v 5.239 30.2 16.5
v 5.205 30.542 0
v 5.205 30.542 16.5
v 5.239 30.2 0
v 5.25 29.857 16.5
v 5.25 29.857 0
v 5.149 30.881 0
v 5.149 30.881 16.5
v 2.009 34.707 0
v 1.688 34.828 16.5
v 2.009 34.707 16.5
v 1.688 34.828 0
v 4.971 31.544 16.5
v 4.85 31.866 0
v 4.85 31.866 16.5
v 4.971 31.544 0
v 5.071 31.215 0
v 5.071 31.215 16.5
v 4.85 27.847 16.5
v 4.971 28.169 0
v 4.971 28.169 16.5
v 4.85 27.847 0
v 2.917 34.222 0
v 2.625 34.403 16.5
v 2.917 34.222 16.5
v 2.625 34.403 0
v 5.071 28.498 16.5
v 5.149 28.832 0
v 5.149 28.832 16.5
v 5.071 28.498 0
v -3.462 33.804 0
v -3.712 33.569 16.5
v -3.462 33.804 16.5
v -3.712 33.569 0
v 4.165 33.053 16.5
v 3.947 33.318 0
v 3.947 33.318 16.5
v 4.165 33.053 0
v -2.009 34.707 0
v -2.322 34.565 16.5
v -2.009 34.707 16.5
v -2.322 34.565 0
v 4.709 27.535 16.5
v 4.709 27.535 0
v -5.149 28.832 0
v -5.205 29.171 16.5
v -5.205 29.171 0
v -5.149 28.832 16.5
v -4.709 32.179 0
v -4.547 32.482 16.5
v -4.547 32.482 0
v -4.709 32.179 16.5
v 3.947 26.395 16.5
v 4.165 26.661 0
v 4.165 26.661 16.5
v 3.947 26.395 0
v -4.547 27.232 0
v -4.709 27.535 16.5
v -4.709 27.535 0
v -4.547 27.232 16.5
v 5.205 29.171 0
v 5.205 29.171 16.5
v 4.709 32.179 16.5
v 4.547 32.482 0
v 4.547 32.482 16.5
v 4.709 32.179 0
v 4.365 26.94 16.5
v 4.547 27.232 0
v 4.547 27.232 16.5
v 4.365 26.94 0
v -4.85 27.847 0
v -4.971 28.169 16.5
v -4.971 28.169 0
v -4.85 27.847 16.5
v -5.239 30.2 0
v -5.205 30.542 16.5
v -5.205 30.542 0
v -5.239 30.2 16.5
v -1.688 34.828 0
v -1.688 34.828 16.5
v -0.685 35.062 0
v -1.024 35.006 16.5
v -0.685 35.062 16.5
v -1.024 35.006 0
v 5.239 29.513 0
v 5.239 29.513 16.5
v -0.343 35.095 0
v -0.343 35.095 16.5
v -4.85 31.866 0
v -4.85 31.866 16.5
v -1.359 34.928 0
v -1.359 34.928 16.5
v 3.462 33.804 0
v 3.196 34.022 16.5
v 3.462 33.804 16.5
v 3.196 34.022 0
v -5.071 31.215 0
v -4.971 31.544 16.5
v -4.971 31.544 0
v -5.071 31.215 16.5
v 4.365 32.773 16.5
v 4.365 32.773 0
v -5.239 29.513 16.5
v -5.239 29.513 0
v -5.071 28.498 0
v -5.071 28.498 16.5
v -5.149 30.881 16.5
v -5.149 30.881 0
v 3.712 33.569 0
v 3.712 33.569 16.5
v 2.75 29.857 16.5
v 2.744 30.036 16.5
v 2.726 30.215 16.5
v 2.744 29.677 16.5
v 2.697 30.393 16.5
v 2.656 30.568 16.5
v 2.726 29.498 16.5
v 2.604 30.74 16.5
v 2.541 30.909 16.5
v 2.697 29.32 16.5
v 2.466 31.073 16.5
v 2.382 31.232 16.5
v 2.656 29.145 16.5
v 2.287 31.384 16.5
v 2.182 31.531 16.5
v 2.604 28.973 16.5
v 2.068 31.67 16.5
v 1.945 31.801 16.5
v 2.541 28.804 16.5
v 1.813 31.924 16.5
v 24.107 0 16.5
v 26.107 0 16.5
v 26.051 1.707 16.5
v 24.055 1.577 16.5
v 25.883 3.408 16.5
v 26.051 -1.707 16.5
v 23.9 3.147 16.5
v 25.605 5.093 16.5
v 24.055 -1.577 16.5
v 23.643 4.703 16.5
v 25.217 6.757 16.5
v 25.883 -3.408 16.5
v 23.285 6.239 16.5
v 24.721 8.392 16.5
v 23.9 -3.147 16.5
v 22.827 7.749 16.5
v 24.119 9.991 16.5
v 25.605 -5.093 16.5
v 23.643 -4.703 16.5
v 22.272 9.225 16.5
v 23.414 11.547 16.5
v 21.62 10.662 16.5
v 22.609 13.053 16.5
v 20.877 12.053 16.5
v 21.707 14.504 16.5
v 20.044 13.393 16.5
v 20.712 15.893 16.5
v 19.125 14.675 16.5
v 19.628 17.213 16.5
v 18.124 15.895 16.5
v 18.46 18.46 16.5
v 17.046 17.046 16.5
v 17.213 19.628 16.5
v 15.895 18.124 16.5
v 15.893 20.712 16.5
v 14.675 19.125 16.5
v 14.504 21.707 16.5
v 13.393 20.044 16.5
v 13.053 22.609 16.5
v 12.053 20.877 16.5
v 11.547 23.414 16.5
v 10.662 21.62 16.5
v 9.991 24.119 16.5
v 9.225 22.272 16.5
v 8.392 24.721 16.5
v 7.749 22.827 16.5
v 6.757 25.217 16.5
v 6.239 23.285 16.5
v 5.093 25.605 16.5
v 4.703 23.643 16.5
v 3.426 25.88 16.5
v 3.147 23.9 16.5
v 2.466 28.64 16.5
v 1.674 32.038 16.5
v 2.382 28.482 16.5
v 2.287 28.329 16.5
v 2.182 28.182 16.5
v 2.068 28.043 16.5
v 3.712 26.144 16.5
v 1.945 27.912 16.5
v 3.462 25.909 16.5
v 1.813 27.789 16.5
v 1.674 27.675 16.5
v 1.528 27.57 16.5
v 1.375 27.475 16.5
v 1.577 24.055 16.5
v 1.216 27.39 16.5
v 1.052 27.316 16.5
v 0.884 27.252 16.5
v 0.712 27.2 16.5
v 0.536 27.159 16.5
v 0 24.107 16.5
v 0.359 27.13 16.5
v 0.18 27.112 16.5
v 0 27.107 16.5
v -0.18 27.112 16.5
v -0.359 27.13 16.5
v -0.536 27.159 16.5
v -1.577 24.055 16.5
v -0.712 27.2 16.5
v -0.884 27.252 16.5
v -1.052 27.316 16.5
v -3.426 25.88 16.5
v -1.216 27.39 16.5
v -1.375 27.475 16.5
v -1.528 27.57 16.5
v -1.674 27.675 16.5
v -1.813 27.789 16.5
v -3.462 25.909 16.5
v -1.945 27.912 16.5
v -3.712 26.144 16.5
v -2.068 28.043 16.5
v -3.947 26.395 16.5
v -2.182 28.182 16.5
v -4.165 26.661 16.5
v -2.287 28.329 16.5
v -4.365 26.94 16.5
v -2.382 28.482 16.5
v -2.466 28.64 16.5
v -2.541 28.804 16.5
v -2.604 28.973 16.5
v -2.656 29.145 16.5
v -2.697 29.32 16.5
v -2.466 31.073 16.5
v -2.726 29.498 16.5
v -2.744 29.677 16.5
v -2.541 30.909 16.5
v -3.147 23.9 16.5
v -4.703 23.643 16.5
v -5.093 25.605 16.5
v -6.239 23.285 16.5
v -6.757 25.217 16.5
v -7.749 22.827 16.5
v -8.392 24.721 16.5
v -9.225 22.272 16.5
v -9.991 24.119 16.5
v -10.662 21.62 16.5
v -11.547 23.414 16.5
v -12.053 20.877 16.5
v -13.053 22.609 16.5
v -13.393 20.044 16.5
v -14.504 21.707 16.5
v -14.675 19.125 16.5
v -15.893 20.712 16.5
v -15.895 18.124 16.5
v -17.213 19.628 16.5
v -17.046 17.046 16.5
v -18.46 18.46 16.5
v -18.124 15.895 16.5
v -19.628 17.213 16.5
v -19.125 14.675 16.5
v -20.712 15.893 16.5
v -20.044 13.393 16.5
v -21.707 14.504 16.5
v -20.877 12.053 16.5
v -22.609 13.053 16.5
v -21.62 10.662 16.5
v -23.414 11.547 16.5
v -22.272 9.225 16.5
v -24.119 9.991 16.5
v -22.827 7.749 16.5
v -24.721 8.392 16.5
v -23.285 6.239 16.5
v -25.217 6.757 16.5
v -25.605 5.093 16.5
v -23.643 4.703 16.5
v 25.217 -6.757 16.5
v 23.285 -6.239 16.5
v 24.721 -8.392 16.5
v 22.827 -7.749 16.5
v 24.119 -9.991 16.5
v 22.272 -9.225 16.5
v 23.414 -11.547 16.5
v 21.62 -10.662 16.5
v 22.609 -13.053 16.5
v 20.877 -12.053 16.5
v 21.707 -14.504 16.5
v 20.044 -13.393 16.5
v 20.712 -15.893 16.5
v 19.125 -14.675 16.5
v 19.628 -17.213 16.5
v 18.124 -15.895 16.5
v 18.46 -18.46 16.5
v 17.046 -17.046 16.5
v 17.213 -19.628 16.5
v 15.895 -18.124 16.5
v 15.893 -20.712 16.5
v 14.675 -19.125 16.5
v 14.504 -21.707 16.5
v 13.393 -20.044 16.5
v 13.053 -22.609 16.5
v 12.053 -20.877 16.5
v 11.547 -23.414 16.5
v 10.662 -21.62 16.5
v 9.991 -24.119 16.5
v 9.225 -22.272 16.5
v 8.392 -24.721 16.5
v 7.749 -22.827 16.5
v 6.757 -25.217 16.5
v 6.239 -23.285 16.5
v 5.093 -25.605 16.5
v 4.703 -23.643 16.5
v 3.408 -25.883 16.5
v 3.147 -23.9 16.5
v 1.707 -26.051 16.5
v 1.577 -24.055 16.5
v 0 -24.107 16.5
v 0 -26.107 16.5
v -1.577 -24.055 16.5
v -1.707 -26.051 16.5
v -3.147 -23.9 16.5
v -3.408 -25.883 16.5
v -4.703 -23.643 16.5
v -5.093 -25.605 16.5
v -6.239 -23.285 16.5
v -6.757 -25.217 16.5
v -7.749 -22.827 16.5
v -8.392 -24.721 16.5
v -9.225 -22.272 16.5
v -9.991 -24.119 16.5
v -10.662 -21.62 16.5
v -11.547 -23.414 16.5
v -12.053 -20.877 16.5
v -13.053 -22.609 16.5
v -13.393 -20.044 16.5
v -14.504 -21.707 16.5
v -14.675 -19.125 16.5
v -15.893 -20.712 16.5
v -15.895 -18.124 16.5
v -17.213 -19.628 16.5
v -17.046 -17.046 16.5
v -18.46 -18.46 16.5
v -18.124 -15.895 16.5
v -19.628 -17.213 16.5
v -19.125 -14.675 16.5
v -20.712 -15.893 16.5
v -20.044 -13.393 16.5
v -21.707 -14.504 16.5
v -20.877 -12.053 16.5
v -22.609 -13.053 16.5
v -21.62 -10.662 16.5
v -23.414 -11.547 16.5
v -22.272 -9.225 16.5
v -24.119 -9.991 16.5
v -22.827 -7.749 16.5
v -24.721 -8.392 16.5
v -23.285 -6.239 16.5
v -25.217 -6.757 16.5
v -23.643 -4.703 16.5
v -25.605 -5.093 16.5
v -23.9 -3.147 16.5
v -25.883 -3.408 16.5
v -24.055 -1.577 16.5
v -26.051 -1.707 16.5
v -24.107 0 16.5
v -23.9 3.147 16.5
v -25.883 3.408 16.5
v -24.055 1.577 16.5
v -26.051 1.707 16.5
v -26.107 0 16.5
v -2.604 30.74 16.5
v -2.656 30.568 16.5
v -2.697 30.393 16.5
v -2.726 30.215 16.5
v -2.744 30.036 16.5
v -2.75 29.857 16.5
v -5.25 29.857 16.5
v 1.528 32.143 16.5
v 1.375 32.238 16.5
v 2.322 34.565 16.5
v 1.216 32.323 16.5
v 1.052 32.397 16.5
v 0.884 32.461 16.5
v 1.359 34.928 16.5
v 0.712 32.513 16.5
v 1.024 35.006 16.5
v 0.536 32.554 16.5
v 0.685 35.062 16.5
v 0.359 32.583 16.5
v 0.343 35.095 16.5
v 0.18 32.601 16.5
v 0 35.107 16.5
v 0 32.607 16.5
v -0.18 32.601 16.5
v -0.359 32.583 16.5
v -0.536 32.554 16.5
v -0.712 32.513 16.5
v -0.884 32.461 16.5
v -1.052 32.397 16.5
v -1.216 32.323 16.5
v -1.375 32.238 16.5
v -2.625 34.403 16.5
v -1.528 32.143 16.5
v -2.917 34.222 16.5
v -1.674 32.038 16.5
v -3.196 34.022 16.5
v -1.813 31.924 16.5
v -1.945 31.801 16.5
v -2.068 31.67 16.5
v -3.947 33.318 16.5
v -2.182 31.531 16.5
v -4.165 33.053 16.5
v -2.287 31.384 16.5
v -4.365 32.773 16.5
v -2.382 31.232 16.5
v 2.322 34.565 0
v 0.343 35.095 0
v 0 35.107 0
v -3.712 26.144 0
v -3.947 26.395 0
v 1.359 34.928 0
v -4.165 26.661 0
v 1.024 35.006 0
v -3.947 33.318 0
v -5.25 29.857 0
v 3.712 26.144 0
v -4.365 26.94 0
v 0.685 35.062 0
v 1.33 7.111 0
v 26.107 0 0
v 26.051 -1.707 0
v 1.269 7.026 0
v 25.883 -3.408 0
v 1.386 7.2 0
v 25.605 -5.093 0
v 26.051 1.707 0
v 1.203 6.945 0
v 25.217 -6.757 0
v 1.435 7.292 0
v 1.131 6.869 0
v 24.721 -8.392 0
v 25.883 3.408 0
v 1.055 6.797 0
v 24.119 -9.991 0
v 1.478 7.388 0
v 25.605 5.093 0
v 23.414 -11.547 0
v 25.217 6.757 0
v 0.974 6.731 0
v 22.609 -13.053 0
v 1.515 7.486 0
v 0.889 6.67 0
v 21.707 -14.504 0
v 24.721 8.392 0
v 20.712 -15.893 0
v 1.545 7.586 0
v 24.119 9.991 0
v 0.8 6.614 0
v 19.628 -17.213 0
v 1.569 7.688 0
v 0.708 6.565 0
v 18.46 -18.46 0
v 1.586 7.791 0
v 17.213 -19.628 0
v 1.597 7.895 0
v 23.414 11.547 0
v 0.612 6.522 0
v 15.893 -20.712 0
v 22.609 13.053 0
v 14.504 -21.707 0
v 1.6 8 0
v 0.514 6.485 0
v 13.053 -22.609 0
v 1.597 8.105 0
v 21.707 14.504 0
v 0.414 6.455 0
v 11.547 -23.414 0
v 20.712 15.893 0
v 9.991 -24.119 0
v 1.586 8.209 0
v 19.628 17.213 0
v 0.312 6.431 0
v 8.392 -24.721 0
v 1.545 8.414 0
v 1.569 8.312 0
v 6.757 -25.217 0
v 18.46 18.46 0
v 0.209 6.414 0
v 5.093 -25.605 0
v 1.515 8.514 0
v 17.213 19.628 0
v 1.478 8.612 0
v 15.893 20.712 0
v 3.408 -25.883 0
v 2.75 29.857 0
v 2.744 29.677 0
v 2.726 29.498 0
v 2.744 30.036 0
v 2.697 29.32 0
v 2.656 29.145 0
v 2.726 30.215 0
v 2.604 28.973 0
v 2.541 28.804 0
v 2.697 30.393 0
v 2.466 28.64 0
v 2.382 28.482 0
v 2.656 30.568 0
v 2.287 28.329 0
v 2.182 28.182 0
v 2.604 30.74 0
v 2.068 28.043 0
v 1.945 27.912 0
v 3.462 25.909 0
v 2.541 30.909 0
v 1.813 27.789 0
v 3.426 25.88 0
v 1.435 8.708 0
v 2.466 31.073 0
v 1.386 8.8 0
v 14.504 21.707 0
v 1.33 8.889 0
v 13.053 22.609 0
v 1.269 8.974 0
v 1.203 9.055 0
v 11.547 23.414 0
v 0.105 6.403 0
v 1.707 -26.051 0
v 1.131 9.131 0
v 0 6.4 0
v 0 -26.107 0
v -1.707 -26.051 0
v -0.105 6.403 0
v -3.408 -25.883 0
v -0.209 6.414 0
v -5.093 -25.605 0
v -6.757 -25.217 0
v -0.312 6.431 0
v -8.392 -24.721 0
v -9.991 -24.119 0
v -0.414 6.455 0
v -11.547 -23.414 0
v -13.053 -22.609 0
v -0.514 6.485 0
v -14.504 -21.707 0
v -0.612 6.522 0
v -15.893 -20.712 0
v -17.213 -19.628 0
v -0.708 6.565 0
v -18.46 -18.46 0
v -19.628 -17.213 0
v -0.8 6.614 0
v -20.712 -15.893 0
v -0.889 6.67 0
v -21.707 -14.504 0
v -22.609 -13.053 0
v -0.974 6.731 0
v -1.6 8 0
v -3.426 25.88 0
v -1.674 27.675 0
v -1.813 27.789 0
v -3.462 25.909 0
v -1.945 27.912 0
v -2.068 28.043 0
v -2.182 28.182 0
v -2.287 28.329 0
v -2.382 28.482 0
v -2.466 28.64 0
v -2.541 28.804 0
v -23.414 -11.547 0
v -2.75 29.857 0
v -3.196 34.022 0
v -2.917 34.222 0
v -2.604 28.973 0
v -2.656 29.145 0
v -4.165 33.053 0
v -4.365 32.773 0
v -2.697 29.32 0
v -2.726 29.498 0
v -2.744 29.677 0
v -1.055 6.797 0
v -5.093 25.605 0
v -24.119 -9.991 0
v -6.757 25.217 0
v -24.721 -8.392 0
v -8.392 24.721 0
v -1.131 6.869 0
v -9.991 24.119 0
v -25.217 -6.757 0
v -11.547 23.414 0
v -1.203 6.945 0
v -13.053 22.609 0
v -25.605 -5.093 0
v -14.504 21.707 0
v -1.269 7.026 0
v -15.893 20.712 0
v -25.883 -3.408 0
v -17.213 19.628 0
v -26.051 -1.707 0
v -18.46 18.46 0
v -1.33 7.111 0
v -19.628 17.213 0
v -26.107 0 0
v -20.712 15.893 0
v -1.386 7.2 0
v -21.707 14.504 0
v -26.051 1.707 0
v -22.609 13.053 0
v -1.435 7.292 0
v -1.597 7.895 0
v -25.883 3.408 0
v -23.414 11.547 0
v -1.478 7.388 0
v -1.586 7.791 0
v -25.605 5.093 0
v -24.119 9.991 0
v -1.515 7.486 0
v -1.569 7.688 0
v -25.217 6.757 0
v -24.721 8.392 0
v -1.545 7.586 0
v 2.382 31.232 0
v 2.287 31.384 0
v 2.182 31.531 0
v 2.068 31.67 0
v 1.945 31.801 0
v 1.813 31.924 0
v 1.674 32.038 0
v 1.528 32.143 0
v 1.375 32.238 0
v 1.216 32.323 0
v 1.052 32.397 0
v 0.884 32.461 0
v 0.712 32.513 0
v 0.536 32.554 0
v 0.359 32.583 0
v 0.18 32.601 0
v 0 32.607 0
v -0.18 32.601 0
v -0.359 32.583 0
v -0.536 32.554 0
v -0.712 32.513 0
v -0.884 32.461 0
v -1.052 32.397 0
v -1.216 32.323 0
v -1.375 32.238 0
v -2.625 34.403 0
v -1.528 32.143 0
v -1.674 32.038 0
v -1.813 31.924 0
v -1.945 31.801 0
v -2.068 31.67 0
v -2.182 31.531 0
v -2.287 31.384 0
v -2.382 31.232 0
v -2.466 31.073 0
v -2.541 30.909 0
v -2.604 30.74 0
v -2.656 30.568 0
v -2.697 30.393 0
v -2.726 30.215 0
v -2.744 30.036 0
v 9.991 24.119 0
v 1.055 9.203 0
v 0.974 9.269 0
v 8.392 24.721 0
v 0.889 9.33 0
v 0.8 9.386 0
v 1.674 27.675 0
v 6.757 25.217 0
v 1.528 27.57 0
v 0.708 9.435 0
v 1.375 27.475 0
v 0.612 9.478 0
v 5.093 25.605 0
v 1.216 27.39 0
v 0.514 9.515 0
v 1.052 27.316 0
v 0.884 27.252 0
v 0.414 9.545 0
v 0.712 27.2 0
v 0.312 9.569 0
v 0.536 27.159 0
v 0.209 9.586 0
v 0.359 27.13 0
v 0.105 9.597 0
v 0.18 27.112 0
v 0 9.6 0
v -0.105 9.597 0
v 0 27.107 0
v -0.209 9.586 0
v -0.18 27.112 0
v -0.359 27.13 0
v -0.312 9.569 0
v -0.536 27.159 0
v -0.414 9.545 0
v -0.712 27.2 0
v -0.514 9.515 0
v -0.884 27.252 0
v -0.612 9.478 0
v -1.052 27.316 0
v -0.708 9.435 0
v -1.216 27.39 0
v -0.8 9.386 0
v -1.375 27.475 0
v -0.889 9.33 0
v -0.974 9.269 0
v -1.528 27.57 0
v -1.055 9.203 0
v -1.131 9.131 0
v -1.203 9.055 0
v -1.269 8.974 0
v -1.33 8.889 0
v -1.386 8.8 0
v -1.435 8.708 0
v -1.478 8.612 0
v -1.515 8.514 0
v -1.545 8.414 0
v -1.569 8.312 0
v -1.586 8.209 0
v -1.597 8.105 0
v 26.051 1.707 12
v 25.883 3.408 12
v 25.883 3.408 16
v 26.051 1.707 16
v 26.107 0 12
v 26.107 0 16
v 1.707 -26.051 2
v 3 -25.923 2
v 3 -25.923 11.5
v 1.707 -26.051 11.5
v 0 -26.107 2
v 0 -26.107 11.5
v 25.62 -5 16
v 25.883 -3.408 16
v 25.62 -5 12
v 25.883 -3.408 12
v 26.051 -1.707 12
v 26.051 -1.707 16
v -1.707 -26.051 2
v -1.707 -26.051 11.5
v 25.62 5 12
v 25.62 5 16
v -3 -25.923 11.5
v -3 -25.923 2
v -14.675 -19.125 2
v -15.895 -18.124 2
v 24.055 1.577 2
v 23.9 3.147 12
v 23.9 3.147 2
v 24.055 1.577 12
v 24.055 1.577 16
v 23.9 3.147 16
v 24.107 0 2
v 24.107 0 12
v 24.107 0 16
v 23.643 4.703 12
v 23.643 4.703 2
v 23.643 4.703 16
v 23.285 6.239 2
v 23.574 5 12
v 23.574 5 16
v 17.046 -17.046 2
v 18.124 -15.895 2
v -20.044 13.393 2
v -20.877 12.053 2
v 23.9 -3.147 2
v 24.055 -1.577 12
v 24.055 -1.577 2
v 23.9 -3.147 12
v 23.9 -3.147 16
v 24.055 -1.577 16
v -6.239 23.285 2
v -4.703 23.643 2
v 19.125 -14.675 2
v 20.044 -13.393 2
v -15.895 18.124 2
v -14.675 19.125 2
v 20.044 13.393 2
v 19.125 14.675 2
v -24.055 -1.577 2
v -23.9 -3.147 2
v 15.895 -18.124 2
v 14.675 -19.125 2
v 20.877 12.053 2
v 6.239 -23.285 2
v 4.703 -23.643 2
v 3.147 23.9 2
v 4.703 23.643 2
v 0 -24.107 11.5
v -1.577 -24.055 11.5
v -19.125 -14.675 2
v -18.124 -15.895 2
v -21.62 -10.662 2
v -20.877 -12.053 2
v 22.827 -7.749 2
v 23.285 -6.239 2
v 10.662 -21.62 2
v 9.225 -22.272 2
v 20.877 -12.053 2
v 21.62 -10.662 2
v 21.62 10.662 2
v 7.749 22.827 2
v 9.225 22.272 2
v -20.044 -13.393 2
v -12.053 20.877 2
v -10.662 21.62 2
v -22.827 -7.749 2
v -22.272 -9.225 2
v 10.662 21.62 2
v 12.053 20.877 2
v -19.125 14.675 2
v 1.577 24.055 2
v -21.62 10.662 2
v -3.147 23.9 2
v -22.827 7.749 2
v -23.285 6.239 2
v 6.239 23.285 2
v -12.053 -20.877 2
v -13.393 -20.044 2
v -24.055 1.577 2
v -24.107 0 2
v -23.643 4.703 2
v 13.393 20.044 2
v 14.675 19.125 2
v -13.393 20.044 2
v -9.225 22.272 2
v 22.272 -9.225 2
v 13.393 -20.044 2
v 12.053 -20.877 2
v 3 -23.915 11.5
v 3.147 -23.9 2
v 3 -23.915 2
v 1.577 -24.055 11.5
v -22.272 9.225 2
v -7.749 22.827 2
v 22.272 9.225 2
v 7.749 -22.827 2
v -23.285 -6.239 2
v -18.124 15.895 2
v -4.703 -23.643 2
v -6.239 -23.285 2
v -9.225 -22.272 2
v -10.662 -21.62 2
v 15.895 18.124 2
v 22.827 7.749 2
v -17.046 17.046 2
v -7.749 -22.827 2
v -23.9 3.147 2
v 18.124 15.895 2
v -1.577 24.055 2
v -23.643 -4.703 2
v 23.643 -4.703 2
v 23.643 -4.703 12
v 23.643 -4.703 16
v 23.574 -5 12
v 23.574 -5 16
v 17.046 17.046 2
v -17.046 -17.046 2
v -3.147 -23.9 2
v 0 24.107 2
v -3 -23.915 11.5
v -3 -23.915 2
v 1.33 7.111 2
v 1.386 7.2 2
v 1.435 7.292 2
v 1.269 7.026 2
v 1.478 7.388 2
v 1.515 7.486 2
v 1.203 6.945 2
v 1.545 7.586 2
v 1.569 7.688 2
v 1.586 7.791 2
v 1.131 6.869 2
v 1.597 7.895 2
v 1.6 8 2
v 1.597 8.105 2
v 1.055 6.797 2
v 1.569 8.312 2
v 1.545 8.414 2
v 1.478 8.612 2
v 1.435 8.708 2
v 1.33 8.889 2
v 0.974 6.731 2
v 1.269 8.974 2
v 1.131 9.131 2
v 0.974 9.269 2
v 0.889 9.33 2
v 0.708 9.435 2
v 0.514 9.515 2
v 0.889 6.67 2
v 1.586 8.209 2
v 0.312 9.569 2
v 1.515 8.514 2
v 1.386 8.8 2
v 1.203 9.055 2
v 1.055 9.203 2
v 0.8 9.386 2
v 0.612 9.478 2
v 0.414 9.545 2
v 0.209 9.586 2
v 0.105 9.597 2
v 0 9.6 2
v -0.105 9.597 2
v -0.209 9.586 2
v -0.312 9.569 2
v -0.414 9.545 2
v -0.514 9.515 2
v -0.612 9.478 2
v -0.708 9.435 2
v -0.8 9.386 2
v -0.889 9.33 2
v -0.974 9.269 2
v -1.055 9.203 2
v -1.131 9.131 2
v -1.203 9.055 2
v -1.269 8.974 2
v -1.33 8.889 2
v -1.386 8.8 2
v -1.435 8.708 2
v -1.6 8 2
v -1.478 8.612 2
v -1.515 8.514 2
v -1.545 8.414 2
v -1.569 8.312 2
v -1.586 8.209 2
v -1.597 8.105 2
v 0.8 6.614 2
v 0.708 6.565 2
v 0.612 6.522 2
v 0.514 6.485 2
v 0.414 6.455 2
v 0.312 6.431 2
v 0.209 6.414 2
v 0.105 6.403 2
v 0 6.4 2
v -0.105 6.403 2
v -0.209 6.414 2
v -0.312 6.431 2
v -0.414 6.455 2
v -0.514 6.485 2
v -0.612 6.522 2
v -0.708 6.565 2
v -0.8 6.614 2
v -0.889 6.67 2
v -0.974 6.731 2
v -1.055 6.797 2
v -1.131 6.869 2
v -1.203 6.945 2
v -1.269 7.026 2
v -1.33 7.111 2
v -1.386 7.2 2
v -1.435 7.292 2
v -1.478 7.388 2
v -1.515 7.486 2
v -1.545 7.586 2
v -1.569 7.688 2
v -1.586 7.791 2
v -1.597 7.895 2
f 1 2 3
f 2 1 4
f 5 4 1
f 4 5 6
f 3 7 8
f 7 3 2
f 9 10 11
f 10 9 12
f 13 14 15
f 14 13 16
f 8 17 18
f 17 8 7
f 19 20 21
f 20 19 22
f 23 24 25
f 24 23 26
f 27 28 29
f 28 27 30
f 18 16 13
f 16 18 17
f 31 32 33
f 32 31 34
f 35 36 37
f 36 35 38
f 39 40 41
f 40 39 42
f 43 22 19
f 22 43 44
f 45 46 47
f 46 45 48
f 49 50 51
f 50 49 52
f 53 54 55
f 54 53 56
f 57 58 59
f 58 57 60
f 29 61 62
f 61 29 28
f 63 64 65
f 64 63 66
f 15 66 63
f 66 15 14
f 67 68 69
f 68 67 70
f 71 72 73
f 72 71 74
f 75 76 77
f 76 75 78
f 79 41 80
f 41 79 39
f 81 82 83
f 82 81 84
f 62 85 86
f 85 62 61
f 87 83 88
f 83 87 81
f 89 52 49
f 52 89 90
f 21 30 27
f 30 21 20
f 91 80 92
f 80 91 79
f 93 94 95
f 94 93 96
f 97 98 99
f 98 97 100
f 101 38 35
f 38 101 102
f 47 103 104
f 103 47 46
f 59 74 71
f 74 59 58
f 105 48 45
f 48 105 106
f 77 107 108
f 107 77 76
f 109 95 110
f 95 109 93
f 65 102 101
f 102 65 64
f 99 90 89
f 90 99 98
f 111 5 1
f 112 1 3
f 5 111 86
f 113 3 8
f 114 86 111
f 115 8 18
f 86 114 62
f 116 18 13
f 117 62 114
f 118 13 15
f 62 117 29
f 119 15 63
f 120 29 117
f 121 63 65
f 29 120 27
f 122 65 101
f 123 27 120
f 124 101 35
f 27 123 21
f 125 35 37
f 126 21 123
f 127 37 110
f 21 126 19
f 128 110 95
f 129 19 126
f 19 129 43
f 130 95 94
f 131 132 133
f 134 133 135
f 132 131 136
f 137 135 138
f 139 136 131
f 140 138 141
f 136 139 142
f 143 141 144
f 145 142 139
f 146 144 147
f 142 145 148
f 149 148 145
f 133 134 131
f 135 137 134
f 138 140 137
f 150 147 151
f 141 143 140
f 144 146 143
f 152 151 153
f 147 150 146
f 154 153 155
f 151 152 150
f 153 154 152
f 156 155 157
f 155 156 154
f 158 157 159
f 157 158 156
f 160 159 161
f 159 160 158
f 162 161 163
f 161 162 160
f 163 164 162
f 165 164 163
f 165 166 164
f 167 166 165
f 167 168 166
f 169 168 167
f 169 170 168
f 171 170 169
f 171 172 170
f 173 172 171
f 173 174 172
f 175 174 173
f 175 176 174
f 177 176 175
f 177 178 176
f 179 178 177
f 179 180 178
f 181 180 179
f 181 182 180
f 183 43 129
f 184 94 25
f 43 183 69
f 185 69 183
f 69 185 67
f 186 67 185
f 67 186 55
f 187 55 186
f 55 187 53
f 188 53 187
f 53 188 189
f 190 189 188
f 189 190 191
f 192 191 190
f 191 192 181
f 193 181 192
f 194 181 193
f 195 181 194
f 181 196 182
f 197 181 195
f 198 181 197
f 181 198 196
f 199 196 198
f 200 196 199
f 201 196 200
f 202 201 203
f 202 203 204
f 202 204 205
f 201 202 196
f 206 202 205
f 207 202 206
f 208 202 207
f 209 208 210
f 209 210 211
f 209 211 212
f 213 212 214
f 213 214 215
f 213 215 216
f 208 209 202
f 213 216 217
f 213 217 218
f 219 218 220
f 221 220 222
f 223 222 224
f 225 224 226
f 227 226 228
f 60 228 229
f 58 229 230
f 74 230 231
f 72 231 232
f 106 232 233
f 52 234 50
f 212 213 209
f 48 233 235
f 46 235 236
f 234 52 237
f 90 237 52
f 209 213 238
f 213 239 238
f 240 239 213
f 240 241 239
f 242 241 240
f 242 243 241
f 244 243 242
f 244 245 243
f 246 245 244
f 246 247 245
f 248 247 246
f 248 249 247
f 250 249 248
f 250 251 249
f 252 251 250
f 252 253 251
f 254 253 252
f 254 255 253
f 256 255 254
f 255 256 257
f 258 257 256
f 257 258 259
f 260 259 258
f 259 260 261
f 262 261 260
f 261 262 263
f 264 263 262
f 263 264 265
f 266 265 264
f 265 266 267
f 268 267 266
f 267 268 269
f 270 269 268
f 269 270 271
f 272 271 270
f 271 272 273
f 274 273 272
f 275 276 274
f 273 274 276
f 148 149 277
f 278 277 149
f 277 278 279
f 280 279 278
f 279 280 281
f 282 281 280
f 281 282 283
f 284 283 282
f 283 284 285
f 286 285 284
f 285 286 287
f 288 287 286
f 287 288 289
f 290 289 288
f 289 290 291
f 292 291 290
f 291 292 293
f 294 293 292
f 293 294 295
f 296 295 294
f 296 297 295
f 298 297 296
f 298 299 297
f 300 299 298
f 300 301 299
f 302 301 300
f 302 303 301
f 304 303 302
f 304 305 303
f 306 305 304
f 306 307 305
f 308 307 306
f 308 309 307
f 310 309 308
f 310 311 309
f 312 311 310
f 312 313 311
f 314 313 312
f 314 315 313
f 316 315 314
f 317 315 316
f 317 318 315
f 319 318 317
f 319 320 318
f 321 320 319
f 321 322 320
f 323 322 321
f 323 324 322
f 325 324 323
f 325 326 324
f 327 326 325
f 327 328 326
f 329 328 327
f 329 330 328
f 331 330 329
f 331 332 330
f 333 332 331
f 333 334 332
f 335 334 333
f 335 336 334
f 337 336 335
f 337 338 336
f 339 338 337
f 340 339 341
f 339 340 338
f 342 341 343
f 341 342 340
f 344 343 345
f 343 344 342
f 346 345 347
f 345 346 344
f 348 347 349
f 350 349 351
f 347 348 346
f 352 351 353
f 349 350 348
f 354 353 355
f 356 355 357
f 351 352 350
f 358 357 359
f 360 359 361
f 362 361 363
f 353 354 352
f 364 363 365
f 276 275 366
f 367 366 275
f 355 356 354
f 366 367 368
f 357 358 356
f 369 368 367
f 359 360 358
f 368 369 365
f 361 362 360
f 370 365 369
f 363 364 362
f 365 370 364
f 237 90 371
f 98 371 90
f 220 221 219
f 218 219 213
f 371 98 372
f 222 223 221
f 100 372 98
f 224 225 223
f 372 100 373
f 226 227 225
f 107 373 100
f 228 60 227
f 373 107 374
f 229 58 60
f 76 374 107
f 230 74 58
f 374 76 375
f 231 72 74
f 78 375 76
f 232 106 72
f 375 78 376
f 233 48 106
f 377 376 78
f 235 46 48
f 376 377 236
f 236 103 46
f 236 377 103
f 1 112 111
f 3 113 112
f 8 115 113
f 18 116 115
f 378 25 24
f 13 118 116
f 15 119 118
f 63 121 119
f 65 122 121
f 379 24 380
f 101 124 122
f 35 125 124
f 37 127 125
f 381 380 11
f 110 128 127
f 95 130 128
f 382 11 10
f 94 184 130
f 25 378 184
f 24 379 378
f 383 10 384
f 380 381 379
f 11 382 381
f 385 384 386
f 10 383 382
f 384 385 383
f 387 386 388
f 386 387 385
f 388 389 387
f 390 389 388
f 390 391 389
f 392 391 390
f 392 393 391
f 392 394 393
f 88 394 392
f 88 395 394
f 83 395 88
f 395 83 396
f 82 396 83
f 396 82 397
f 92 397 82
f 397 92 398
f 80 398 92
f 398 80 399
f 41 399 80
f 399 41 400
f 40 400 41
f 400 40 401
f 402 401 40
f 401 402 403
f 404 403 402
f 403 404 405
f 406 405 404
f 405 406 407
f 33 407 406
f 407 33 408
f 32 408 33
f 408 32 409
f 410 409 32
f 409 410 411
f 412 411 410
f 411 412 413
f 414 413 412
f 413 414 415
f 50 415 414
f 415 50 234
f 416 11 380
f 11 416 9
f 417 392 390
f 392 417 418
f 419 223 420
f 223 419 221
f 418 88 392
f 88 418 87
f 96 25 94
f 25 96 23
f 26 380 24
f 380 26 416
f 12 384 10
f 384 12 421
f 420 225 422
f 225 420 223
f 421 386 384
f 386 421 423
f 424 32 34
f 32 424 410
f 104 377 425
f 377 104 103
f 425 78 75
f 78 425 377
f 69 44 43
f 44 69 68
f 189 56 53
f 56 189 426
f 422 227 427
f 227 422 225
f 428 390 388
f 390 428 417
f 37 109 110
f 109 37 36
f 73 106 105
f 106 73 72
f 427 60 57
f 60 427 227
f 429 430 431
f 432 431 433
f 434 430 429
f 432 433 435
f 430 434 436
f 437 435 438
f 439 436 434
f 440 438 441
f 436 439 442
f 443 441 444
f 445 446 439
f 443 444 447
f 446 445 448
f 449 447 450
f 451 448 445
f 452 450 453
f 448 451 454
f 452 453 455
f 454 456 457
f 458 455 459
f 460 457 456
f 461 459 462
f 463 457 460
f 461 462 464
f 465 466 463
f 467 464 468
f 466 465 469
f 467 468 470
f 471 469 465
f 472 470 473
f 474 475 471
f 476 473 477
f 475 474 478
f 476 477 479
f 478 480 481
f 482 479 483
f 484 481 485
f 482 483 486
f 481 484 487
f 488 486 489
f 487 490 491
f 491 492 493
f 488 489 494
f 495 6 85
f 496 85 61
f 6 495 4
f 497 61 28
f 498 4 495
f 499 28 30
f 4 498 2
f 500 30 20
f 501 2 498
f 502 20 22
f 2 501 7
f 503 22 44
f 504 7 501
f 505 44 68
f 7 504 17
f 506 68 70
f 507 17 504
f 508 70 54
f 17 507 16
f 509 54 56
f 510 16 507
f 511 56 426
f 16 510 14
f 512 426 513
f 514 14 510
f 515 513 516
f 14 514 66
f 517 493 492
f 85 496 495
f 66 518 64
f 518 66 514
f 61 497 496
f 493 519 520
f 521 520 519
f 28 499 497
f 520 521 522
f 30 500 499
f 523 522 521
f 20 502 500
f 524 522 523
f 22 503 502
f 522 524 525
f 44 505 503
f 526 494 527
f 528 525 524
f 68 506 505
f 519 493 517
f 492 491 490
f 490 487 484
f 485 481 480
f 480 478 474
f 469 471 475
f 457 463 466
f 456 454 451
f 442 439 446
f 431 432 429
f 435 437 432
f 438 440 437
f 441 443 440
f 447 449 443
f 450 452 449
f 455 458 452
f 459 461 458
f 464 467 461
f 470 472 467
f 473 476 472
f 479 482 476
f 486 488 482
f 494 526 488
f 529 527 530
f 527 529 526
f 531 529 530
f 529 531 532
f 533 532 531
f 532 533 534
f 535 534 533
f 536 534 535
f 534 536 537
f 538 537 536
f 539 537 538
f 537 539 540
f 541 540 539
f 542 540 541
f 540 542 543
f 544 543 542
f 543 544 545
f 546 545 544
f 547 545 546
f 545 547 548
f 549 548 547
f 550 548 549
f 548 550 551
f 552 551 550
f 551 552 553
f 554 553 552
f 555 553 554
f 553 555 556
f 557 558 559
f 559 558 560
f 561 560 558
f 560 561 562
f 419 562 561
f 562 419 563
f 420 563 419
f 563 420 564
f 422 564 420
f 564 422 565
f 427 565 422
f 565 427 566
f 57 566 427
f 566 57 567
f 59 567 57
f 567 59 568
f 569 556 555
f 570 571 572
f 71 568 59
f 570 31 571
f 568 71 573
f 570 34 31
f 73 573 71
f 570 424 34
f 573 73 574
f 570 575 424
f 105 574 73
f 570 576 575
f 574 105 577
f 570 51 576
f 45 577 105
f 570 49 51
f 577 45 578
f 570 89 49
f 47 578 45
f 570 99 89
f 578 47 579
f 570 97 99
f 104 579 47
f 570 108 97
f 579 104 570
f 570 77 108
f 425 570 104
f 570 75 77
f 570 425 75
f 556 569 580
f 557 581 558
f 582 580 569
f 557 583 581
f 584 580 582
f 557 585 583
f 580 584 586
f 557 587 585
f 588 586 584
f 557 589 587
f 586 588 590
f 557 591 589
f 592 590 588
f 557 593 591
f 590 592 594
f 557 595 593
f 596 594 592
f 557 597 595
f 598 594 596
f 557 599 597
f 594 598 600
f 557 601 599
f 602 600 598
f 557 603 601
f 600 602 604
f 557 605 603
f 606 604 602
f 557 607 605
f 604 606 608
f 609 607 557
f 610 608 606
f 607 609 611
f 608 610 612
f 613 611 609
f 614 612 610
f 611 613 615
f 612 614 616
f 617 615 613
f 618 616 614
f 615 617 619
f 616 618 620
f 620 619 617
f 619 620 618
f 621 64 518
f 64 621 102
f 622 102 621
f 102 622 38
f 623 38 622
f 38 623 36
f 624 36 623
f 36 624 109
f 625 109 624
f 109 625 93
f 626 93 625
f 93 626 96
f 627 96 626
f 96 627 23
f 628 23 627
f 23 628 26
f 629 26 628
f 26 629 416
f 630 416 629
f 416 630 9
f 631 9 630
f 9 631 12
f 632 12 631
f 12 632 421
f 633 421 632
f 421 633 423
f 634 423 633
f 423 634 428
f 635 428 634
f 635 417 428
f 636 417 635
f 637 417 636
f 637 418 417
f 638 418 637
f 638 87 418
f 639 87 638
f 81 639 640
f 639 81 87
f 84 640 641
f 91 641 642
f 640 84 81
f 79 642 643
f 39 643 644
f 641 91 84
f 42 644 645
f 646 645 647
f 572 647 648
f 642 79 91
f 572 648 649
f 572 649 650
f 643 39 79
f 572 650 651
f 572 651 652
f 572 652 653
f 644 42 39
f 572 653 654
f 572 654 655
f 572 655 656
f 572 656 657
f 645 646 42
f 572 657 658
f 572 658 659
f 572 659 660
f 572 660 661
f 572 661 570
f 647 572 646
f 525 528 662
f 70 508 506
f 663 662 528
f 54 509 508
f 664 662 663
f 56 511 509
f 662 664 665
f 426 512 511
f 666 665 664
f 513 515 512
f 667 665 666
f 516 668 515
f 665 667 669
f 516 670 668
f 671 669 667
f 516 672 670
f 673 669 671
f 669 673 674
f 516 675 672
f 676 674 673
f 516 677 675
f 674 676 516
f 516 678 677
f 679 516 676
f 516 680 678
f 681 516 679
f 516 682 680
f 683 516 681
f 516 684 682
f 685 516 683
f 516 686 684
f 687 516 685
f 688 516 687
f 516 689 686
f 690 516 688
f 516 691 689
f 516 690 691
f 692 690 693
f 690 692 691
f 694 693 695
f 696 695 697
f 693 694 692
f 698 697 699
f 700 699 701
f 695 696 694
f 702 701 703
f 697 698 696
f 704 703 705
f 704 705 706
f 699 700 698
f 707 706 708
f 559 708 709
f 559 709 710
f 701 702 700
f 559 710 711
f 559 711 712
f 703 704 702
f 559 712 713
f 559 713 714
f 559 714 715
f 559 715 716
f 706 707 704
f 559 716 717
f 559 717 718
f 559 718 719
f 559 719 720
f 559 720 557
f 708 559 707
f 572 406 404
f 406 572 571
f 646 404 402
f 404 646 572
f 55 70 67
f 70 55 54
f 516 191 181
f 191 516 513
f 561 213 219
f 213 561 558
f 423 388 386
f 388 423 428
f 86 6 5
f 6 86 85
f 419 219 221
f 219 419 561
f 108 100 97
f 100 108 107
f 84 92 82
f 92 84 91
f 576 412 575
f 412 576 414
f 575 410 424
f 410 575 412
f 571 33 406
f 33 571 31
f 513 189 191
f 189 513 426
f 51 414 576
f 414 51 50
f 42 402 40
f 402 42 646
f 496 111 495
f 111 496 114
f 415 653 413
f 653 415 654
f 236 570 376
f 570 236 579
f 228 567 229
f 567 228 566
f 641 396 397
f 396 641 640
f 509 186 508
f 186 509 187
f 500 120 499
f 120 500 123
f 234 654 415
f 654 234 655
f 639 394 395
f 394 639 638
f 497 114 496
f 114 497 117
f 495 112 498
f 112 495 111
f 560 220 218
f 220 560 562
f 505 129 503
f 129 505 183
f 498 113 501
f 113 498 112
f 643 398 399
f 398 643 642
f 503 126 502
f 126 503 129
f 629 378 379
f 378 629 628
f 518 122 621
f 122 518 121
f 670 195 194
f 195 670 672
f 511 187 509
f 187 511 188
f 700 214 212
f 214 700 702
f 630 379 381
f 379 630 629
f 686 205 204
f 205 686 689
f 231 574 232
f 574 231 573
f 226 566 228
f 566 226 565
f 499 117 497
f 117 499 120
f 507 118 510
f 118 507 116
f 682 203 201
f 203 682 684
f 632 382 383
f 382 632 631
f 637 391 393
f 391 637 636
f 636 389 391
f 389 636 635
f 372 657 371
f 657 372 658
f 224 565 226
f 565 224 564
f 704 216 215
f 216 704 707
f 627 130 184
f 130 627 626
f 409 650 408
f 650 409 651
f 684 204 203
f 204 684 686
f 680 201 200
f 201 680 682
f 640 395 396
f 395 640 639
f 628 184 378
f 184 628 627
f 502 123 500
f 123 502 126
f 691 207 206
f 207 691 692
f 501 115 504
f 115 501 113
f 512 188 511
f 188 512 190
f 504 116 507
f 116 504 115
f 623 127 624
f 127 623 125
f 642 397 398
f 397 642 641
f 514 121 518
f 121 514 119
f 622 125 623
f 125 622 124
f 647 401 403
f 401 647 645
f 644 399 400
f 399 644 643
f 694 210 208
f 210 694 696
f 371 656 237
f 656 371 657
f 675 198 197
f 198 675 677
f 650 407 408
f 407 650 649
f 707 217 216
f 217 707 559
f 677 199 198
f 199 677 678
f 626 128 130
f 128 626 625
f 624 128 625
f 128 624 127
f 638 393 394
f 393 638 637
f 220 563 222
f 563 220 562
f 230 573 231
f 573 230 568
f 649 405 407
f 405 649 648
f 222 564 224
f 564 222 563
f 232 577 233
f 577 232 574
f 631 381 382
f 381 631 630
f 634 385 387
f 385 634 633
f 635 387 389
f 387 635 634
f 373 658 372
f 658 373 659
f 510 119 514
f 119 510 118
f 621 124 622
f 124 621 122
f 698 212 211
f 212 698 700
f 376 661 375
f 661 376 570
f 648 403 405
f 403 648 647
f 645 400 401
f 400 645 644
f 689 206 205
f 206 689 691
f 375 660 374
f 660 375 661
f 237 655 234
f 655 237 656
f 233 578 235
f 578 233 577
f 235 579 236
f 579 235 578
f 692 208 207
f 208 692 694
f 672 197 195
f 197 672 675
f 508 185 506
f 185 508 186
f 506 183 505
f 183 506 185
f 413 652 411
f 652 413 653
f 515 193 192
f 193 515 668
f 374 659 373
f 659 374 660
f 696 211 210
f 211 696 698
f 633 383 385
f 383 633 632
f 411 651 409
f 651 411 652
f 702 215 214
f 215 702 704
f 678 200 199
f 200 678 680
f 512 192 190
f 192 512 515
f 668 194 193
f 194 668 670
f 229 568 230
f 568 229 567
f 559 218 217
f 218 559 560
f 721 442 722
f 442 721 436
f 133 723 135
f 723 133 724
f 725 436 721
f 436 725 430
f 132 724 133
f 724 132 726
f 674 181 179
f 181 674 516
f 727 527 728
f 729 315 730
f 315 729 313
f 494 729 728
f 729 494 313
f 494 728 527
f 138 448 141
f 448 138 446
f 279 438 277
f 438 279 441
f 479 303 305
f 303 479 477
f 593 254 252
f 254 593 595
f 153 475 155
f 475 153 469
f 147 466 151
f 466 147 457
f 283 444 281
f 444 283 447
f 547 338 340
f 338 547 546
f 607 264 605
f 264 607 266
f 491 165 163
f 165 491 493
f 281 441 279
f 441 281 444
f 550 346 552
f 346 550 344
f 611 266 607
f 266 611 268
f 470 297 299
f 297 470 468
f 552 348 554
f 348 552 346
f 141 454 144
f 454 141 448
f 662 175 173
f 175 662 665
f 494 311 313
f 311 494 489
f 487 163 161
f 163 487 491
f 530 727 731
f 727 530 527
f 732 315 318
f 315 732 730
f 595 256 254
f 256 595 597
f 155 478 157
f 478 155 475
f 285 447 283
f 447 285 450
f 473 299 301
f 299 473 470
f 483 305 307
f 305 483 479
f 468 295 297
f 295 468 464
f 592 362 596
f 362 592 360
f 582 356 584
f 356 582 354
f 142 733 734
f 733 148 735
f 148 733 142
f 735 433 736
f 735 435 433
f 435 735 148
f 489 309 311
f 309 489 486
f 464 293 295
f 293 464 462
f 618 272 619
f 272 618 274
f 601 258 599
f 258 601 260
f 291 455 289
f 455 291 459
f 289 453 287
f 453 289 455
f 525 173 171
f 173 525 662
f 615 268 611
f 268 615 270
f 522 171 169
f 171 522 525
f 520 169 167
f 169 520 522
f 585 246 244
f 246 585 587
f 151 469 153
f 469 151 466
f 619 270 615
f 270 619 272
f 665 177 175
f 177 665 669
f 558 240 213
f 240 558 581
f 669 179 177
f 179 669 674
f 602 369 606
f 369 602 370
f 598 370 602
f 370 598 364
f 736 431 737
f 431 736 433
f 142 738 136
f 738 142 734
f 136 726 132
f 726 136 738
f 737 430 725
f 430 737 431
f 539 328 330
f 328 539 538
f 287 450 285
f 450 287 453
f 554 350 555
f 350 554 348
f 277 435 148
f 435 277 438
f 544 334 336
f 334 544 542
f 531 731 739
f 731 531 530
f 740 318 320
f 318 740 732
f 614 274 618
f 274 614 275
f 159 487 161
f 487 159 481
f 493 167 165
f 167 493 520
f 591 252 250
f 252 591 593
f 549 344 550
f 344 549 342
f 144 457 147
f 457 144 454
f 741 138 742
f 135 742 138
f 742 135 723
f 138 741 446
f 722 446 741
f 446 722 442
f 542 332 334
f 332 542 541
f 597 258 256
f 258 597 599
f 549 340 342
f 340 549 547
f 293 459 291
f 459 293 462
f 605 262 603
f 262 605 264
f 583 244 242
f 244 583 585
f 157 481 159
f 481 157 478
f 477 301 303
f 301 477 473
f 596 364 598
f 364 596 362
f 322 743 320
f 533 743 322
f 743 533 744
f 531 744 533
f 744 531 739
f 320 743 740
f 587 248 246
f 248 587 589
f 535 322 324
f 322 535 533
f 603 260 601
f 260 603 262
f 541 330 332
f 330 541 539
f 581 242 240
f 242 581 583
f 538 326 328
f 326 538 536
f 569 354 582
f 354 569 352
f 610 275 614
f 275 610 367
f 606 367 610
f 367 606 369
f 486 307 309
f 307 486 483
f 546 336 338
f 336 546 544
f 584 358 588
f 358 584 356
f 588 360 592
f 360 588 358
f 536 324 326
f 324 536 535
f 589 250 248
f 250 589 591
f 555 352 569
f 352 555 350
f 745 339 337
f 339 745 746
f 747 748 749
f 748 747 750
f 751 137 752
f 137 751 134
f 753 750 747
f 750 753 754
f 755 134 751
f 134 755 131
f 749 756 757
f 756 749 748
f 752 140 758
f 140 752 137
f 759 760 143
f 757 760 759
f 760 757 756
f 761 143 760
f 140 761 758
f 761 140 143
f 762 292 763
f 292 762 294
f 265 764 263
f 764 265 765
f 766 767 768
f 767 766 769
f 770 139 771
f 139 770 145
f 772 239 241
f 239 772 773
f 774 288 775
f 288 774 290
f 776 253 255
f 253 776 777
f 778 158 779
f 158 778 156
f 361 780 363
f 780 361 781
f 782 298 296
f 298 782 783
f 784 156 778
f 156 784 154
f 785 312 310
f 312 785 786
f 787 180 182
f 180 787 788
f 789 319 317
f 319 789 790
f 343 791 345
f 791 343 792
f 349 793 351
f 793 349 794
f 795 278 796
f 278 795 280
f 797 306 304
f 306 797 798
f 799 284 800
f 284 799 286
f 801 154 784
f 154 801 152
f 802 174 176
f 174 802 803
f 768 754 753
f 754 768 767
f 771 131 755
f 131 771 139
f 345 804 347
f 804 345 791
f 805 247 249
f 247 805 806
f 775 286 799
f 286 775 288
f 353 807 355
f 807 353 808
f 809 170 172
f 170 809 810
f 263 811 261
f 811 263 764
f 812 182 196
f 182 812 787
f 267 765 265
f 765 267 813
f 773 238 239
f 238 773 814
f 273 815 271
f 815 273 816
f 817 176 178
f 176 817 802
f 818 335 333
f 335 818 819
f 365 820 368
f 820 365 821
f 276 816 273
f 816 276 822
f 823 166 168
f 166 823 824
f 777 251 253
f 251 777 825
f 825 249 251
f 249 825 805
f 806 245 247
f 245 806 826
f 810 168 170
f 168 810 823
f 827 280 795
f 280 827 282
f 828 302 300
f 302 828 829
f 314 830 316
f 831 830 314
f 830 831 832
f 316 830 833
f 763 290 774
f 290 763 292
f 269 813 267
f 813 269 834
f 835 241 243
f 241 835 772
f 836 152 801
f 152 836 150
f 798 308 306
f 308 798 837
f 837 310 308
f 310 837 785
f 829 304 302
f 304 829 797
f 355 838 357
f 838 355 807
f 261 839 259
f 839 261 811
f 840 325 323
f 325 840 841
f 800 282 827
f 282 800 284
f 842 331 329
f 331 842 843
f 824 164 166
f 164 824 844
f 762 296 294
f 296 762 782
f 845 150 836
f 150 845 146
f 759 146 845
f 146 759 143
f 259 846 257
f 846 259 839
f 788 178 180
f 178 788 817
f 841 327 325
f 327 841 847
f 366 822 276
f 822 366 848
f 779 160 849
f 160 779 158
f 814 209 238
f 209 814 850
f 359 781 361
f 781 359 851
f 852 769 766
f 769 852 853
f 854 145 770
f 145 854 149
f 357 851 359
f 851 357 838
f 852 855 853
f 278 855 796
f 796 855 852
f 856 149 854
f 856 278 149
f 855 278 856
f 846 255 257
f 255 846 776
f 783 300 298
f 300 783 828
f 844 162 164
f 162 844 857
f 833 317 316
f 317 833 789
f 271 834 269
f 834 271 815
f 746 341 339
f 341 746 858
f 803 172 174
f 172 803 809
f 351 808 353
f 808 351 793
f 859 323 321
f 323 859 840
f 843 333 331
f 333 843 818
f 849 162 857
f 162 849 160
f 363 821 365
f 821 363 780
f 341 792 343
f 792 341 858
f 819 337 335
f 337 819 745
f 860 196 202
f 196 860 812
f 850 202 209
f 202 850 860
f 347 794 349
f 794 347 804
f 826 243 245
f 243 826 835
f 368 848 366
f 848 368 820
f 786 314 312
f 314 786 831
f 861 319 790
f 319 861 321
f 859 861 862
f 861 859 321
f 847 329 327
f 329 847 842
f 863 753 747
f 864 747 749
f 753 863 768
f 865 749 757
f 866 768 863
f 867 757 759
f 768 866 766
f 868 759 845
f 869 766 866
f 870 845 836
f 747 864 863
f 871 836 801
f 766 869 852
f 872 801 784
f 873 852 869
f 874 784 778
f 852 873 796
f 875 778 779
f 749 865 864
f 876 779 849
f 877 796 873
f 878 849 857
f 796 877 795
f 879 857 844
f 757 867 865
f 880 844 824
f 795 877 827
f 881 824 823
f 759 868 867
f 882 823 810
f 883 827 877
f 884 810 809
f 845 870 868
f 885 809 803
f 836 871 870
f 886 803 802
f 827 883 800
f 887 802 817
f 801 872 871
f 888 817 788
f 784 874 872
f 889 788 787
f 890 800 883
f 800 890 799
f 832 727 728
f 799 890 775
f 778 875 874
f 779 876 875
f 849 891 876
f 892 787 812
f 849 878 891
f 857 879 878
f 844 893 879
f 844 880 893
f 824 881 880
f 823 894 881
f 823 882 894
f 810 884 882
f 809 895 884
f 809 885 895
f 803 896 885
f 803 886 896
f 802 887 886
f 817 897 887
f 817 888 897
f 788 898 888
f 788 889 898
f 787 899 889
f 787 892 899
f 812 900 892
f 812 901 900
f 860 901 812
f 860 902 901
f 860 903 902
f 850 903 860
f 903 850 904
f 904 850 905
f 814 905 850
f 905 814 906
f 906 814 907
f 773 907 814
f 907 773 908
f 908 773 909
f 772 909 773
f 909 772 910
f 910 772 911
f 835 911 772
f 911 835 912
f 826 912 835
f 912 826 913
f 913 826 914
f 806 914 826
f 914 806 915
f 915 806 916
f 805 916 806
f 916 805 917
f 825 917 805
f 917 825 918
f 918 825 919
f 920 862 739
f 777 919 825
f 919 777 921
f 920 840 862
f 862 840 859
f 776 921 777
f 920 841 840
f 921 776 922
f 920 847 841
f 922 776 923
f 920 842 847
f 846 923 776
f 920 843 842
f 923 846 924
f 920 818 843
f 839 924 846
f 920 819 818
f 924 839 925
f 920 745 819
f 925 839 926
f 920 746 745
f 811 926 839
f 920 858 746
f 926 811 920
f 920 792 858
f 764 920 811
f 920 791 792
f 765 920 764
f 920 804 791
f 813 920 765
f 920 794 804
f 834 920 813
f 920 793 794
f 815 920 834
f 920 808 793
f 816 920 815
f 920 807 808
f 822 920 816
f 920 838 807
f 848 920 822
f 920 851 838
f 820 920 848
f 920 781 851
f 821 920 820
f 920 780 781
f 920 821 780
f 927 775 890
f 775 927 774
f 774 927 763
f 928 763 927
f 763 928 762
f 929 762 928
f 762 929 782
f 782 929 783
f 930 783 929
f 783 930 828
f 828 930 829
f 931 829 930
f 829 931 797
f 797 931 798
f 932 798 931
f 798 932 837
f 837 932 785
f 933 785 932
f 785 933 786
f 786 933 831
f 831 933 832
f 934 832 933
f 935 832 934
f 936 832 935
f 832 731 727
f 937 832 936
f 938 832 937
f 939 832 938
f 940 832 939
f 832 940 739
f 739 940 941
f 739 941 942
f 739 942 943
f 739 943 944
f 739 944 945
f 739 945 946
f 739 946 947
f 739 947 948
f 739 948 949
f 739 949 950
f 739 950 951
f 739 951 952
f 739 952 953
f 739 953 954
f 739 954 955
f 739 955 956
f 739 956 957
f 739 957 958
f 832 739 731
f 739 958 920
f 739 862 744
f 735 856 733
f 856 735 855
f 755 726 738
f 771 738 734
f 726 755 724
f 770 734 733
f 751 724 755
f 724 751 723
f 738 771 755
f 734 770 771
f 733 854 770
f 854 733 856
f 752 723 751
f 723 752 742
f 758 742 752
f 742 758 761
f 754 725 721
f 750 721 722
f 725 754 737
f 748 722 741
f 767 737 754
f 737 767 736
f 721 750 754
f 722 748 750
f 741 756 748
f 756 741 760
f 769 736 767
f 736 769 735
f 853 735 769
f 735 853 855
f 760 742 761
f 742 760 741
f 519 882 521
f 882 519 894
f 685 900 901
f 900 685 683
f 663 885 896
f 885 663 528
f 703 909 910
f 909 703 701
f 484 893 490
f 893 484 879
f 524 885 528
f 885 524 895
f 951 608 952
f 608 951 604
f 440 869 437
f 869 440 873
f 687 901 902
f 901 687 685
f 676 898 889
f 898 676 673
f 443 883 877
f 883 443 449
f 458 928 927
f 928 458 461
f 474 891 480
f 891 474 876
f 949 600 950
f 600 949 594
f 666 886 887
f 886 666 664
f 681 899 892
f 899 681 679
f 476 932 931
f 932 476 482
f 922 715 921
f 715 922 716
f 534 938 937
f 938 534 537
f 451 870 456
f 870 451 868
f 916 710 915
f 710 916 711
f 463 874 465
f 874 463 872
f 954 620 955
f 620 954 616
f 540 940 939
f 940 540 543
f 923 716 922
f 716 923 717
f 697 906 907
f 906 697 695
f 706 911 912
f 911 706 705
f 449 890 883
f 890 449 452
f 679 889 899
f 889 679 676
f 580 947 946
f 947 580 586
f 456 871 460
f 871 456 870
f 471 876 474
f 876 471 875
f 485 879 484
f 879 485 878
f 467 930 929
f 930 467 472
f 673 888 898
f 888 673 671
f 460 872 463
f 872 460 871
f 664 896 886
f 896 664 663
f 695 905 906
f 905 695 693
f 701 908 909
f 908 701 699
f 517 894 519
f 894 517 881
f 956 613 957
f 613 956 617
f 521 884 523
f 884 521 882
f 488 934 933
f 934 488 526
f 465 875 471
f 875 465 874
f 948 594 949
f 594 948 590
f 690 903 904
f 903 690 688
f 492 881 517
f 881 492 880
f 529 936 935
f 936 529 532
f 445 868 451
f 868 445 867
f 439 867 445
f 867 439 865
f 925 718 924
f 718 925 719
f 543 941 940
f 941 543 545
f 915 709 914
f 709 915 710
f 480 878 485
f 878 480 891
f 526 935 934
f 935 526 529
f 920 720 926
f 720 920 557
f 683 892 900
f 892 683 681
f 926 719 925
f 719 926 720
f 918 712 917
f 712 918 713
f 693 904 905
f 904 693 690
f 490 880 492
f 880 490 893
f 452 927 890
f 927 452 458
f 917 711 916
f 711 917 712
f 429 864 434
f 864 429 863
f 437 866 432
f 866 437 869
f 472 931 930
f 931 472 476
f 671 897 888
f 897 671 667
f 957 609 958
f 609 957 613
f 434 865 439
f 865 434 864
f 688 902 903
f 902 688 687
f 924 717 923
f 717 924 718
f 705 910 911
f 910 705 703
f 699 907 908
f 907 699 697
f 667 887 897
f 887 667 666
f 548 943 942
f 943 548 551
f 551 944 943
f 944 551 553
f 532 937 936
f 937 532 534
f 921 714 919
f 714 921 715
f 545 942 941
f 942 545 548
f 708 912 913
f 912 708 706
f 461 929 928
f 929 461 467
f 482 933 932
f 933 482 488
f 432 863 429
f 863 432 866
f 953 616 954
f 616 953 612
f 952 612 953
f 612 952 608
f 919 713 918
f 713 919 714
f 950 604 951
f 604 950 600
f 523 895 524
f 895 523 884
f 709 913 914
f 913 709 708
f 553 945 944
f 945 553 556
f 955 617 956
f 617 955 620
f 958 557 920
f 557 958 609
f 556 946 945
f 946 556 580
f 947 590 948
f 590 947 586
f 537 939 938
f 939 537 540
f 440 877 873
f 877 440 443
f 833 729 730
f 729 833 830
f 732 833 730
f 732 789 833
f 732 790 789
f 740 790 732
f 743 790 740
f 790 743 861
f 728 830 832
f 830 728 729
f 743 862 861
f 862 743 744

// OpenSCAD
// ============================================================================
// Keychain case for the Waveshare ESP32-S3-LCD-1.28 (round GC9A01, no touch)
// ============================================================================
//
// IMPORTANT -- read before printing:
// The display opening (32.4mm) is a solid number: a "1.28 inch" round panel
// is 32.51mm across by definition, so that part is trustworthy.
// The PCB outer diameter, and WHERE the USB-C port / BOOT button / battery
// connector sit, are NOT things I have a verified drawing for -- Waveshare
// only publishes those as a PDF image, not machine-readable numbers. Also
// note: the BOOT button is mounted on the board's BACK face (confirmed), not
// its edge, so its access hole goes through the case's back floor, not the
// side wall like the USB-C port does. Before printing:
//   1. Measure your actual board's diameter with calipers and update
//      board_diameter below.
//   2. With the board back-side up and USB-C pointing toward you (6 o'clock),
//      measure the BOOT button's position from board center and update
//      boot_x/boot_y. Note the USB-C port's edge position too and update
//      usb_c_angle if needed.
//   3. Print the BODY alone first in draft quality (thick layers, low infill)
//      as a fit test before committing filament to a nicer finish.
//
// Prints as two parts -- set part below, or "both" just to look at them
// together (don't print "both" as one plate).

part = "body";  // "body" | "lid" | "both"

// ---- Board dimensions (VERIFY board_diameter against your real board) ----
board_diameter   = 37.6;  // outer edge of the round PCB, mm -- ESTIMATE, VERIFY
display_active_d = 32.4;  // "1.28 inch" round glass = 32.51mm -- this one's solid
board_thickness  = 1.6;   // standard PCB thickness
component_clearance = 5;  // depth below the board for USB-C jack / battery connector / any header pins

// ---- USB-C cutout on the case wall (VERIFY POSITION) ----
usb_c_width  = 10;
usb_c_height = 4;
usb_c_angle  = 270;   // degrees around the case where the port sits (270 = "6 o'clock")

// ---- BOOT button access hole (VERIFY POSITION) ----
// This board's BOOT button is mounted on the board's BACK face, not its edge --
// so this drills a vertical hole through the case's back FLOOR, not the side
// wall. To find boot_x/boot_y: look at the back of your board with the USB-C
// port pointing toward you (6 o'clock), then measure the button's center from
// the board's middle, left/right and up/down, in mm. The values below are a
// placeholder guess, not a measurement.
boot_hole_d = 3.2;
boot_x = 0;   // mm from board center, left(-) / right(+) -- ESTIMATE, VERIFY
boot_y = 8;   // mm from board center, away-from-USB-C(+) / toward-it(-) -- ESTIMATE, VERIFY

// ---- Battery connector wire slot, from the pocket up to the board ----
batt_conn_angle = 180; // 180 = "9 o'clock" -- opposite the USB-C port by default

// ---- Battery compartment (behind the board) ----
// Sized for the Grobotronics 3.7V 620mAh Molex-1.25mm cell (40x20x8.5mm),
// plus a little clearance for an easy fit and wire routing.
batt_length = 42;
batt_width  = 22;
batt_thickness = 9.5;

// ---- Case shell ----
wall = 2.0;
lid_lip = 1.2;         // how far the lid's inner lip plugs into the body
fit_clearance = 0.4;   // extra radius so the board isn't press-fit
keychain_loop_d = 5.5; // inner hole diameter for a keyring
keychain_loop_wall = 2.5;

$fn = 96;

// This battery's footprint (40x20mm) is close to the board's own diameter, so a
// case sized only to the board can't also enclose it -- the case grows to fit
// whichever is larger. With the 620mAh cell above, the battery is what drives
// the size: expect a ~52mm case, not a ~42mm one.
board_based_diameter = board_diameter + 2*fit_clearance + 2*wall;
battery_based_diameter = sqrt(pow(batt_length, 2) + pow(batt_width, 2)) + 2*wall + 2*fit_clearance;
case_diameter = max(board_based_diameter, battery_based_diameter);
body_depth = component_clearance + batt_thickness + wall;
lid_depth = board_thickness + 2.5;

// ---------------------------------------------------------------------------

module keychain_loop(h) {
    r_outer = keychain_loop_d/2 + keychain_loop_wall;
    translate([0, case_diameter/2 + r_outer - 1.5, h/2])
        difference() {
            cylinder(h = h, r = r_outer, center = true);
            cylinder(h = h + 2, r = keychain_loop_d/2, center = true);
        }
}

module body() {
    difference() {
        union() {
            cylinder(h = body_depth, d = case_diameter);
            keychain_loop(body_depth);
        }
        // hollow interior -- the battery just sits loose in here (secure it with a
        // strip of foam or double-sided tape), no separate pocket cut needed now
        // that it's roughly the same footprint as the board itself
        translate([0, 0, wall])
            cylinder(h = body_depth, d = case_diameter - 2*wall);

        // USB-C cutout through the wall
        rotate([0, 0, usb_c_angle])
            translate([0, case_diameter/2 - wall/2, body_depth - component_clearance/2])
                cube([usb_c_width, wall*3, usb_c_height], center = true);

        // BOOT button access hole through the BACK FLOOR (vertical) -- this
        // board's button is back-mounted, not edge-mounted, unlike the USB-C
        // port above which genuinely is on the edge
        translate([boot_x, boot_y, -1])
            cylinder(h = wall + 2, d = boot_hole_d);

        // slot for the battery connector wire to reach the board
        // (this one's still assumed edge-mounted -- worth double-checking
        // the same way you caught the button, since I haven't verified it either)
        rotate([0, 0, batt_conn_angle])
            translate([0, case_diameter/2 - wall/2, wall + batt_thickness/2])
                cube([6, wall*3, batt_thickness], center = true);
    }
}

module lid() {
    difference() {
        union() {
            cylinder(h = lid_depth, d = case_diameter);
            // inner lip that plugs into the body for a friction-fit close
            translate([0, 0, -lid_lip])
                cylinder(h = lid_lip, d = case_diameter - 2*wall - 0.4);
        }
        // display window
        translate([0, 0, -1])
            cylinder(h = lid_depth + 2, d = display_active_d);
        // thin the lip so it isn't one solid slab on top of the display
        translate([0, 0, 1.5])
            cylinder(h = lid_depth, d = case_diameter - 2*wall - 2);
    }
}

if (part == "body") body();
if (part == "lid") lid();
if (part == "both") {
    body();
    translate([case_diameter + 12, 0, 0]) lid();
}
